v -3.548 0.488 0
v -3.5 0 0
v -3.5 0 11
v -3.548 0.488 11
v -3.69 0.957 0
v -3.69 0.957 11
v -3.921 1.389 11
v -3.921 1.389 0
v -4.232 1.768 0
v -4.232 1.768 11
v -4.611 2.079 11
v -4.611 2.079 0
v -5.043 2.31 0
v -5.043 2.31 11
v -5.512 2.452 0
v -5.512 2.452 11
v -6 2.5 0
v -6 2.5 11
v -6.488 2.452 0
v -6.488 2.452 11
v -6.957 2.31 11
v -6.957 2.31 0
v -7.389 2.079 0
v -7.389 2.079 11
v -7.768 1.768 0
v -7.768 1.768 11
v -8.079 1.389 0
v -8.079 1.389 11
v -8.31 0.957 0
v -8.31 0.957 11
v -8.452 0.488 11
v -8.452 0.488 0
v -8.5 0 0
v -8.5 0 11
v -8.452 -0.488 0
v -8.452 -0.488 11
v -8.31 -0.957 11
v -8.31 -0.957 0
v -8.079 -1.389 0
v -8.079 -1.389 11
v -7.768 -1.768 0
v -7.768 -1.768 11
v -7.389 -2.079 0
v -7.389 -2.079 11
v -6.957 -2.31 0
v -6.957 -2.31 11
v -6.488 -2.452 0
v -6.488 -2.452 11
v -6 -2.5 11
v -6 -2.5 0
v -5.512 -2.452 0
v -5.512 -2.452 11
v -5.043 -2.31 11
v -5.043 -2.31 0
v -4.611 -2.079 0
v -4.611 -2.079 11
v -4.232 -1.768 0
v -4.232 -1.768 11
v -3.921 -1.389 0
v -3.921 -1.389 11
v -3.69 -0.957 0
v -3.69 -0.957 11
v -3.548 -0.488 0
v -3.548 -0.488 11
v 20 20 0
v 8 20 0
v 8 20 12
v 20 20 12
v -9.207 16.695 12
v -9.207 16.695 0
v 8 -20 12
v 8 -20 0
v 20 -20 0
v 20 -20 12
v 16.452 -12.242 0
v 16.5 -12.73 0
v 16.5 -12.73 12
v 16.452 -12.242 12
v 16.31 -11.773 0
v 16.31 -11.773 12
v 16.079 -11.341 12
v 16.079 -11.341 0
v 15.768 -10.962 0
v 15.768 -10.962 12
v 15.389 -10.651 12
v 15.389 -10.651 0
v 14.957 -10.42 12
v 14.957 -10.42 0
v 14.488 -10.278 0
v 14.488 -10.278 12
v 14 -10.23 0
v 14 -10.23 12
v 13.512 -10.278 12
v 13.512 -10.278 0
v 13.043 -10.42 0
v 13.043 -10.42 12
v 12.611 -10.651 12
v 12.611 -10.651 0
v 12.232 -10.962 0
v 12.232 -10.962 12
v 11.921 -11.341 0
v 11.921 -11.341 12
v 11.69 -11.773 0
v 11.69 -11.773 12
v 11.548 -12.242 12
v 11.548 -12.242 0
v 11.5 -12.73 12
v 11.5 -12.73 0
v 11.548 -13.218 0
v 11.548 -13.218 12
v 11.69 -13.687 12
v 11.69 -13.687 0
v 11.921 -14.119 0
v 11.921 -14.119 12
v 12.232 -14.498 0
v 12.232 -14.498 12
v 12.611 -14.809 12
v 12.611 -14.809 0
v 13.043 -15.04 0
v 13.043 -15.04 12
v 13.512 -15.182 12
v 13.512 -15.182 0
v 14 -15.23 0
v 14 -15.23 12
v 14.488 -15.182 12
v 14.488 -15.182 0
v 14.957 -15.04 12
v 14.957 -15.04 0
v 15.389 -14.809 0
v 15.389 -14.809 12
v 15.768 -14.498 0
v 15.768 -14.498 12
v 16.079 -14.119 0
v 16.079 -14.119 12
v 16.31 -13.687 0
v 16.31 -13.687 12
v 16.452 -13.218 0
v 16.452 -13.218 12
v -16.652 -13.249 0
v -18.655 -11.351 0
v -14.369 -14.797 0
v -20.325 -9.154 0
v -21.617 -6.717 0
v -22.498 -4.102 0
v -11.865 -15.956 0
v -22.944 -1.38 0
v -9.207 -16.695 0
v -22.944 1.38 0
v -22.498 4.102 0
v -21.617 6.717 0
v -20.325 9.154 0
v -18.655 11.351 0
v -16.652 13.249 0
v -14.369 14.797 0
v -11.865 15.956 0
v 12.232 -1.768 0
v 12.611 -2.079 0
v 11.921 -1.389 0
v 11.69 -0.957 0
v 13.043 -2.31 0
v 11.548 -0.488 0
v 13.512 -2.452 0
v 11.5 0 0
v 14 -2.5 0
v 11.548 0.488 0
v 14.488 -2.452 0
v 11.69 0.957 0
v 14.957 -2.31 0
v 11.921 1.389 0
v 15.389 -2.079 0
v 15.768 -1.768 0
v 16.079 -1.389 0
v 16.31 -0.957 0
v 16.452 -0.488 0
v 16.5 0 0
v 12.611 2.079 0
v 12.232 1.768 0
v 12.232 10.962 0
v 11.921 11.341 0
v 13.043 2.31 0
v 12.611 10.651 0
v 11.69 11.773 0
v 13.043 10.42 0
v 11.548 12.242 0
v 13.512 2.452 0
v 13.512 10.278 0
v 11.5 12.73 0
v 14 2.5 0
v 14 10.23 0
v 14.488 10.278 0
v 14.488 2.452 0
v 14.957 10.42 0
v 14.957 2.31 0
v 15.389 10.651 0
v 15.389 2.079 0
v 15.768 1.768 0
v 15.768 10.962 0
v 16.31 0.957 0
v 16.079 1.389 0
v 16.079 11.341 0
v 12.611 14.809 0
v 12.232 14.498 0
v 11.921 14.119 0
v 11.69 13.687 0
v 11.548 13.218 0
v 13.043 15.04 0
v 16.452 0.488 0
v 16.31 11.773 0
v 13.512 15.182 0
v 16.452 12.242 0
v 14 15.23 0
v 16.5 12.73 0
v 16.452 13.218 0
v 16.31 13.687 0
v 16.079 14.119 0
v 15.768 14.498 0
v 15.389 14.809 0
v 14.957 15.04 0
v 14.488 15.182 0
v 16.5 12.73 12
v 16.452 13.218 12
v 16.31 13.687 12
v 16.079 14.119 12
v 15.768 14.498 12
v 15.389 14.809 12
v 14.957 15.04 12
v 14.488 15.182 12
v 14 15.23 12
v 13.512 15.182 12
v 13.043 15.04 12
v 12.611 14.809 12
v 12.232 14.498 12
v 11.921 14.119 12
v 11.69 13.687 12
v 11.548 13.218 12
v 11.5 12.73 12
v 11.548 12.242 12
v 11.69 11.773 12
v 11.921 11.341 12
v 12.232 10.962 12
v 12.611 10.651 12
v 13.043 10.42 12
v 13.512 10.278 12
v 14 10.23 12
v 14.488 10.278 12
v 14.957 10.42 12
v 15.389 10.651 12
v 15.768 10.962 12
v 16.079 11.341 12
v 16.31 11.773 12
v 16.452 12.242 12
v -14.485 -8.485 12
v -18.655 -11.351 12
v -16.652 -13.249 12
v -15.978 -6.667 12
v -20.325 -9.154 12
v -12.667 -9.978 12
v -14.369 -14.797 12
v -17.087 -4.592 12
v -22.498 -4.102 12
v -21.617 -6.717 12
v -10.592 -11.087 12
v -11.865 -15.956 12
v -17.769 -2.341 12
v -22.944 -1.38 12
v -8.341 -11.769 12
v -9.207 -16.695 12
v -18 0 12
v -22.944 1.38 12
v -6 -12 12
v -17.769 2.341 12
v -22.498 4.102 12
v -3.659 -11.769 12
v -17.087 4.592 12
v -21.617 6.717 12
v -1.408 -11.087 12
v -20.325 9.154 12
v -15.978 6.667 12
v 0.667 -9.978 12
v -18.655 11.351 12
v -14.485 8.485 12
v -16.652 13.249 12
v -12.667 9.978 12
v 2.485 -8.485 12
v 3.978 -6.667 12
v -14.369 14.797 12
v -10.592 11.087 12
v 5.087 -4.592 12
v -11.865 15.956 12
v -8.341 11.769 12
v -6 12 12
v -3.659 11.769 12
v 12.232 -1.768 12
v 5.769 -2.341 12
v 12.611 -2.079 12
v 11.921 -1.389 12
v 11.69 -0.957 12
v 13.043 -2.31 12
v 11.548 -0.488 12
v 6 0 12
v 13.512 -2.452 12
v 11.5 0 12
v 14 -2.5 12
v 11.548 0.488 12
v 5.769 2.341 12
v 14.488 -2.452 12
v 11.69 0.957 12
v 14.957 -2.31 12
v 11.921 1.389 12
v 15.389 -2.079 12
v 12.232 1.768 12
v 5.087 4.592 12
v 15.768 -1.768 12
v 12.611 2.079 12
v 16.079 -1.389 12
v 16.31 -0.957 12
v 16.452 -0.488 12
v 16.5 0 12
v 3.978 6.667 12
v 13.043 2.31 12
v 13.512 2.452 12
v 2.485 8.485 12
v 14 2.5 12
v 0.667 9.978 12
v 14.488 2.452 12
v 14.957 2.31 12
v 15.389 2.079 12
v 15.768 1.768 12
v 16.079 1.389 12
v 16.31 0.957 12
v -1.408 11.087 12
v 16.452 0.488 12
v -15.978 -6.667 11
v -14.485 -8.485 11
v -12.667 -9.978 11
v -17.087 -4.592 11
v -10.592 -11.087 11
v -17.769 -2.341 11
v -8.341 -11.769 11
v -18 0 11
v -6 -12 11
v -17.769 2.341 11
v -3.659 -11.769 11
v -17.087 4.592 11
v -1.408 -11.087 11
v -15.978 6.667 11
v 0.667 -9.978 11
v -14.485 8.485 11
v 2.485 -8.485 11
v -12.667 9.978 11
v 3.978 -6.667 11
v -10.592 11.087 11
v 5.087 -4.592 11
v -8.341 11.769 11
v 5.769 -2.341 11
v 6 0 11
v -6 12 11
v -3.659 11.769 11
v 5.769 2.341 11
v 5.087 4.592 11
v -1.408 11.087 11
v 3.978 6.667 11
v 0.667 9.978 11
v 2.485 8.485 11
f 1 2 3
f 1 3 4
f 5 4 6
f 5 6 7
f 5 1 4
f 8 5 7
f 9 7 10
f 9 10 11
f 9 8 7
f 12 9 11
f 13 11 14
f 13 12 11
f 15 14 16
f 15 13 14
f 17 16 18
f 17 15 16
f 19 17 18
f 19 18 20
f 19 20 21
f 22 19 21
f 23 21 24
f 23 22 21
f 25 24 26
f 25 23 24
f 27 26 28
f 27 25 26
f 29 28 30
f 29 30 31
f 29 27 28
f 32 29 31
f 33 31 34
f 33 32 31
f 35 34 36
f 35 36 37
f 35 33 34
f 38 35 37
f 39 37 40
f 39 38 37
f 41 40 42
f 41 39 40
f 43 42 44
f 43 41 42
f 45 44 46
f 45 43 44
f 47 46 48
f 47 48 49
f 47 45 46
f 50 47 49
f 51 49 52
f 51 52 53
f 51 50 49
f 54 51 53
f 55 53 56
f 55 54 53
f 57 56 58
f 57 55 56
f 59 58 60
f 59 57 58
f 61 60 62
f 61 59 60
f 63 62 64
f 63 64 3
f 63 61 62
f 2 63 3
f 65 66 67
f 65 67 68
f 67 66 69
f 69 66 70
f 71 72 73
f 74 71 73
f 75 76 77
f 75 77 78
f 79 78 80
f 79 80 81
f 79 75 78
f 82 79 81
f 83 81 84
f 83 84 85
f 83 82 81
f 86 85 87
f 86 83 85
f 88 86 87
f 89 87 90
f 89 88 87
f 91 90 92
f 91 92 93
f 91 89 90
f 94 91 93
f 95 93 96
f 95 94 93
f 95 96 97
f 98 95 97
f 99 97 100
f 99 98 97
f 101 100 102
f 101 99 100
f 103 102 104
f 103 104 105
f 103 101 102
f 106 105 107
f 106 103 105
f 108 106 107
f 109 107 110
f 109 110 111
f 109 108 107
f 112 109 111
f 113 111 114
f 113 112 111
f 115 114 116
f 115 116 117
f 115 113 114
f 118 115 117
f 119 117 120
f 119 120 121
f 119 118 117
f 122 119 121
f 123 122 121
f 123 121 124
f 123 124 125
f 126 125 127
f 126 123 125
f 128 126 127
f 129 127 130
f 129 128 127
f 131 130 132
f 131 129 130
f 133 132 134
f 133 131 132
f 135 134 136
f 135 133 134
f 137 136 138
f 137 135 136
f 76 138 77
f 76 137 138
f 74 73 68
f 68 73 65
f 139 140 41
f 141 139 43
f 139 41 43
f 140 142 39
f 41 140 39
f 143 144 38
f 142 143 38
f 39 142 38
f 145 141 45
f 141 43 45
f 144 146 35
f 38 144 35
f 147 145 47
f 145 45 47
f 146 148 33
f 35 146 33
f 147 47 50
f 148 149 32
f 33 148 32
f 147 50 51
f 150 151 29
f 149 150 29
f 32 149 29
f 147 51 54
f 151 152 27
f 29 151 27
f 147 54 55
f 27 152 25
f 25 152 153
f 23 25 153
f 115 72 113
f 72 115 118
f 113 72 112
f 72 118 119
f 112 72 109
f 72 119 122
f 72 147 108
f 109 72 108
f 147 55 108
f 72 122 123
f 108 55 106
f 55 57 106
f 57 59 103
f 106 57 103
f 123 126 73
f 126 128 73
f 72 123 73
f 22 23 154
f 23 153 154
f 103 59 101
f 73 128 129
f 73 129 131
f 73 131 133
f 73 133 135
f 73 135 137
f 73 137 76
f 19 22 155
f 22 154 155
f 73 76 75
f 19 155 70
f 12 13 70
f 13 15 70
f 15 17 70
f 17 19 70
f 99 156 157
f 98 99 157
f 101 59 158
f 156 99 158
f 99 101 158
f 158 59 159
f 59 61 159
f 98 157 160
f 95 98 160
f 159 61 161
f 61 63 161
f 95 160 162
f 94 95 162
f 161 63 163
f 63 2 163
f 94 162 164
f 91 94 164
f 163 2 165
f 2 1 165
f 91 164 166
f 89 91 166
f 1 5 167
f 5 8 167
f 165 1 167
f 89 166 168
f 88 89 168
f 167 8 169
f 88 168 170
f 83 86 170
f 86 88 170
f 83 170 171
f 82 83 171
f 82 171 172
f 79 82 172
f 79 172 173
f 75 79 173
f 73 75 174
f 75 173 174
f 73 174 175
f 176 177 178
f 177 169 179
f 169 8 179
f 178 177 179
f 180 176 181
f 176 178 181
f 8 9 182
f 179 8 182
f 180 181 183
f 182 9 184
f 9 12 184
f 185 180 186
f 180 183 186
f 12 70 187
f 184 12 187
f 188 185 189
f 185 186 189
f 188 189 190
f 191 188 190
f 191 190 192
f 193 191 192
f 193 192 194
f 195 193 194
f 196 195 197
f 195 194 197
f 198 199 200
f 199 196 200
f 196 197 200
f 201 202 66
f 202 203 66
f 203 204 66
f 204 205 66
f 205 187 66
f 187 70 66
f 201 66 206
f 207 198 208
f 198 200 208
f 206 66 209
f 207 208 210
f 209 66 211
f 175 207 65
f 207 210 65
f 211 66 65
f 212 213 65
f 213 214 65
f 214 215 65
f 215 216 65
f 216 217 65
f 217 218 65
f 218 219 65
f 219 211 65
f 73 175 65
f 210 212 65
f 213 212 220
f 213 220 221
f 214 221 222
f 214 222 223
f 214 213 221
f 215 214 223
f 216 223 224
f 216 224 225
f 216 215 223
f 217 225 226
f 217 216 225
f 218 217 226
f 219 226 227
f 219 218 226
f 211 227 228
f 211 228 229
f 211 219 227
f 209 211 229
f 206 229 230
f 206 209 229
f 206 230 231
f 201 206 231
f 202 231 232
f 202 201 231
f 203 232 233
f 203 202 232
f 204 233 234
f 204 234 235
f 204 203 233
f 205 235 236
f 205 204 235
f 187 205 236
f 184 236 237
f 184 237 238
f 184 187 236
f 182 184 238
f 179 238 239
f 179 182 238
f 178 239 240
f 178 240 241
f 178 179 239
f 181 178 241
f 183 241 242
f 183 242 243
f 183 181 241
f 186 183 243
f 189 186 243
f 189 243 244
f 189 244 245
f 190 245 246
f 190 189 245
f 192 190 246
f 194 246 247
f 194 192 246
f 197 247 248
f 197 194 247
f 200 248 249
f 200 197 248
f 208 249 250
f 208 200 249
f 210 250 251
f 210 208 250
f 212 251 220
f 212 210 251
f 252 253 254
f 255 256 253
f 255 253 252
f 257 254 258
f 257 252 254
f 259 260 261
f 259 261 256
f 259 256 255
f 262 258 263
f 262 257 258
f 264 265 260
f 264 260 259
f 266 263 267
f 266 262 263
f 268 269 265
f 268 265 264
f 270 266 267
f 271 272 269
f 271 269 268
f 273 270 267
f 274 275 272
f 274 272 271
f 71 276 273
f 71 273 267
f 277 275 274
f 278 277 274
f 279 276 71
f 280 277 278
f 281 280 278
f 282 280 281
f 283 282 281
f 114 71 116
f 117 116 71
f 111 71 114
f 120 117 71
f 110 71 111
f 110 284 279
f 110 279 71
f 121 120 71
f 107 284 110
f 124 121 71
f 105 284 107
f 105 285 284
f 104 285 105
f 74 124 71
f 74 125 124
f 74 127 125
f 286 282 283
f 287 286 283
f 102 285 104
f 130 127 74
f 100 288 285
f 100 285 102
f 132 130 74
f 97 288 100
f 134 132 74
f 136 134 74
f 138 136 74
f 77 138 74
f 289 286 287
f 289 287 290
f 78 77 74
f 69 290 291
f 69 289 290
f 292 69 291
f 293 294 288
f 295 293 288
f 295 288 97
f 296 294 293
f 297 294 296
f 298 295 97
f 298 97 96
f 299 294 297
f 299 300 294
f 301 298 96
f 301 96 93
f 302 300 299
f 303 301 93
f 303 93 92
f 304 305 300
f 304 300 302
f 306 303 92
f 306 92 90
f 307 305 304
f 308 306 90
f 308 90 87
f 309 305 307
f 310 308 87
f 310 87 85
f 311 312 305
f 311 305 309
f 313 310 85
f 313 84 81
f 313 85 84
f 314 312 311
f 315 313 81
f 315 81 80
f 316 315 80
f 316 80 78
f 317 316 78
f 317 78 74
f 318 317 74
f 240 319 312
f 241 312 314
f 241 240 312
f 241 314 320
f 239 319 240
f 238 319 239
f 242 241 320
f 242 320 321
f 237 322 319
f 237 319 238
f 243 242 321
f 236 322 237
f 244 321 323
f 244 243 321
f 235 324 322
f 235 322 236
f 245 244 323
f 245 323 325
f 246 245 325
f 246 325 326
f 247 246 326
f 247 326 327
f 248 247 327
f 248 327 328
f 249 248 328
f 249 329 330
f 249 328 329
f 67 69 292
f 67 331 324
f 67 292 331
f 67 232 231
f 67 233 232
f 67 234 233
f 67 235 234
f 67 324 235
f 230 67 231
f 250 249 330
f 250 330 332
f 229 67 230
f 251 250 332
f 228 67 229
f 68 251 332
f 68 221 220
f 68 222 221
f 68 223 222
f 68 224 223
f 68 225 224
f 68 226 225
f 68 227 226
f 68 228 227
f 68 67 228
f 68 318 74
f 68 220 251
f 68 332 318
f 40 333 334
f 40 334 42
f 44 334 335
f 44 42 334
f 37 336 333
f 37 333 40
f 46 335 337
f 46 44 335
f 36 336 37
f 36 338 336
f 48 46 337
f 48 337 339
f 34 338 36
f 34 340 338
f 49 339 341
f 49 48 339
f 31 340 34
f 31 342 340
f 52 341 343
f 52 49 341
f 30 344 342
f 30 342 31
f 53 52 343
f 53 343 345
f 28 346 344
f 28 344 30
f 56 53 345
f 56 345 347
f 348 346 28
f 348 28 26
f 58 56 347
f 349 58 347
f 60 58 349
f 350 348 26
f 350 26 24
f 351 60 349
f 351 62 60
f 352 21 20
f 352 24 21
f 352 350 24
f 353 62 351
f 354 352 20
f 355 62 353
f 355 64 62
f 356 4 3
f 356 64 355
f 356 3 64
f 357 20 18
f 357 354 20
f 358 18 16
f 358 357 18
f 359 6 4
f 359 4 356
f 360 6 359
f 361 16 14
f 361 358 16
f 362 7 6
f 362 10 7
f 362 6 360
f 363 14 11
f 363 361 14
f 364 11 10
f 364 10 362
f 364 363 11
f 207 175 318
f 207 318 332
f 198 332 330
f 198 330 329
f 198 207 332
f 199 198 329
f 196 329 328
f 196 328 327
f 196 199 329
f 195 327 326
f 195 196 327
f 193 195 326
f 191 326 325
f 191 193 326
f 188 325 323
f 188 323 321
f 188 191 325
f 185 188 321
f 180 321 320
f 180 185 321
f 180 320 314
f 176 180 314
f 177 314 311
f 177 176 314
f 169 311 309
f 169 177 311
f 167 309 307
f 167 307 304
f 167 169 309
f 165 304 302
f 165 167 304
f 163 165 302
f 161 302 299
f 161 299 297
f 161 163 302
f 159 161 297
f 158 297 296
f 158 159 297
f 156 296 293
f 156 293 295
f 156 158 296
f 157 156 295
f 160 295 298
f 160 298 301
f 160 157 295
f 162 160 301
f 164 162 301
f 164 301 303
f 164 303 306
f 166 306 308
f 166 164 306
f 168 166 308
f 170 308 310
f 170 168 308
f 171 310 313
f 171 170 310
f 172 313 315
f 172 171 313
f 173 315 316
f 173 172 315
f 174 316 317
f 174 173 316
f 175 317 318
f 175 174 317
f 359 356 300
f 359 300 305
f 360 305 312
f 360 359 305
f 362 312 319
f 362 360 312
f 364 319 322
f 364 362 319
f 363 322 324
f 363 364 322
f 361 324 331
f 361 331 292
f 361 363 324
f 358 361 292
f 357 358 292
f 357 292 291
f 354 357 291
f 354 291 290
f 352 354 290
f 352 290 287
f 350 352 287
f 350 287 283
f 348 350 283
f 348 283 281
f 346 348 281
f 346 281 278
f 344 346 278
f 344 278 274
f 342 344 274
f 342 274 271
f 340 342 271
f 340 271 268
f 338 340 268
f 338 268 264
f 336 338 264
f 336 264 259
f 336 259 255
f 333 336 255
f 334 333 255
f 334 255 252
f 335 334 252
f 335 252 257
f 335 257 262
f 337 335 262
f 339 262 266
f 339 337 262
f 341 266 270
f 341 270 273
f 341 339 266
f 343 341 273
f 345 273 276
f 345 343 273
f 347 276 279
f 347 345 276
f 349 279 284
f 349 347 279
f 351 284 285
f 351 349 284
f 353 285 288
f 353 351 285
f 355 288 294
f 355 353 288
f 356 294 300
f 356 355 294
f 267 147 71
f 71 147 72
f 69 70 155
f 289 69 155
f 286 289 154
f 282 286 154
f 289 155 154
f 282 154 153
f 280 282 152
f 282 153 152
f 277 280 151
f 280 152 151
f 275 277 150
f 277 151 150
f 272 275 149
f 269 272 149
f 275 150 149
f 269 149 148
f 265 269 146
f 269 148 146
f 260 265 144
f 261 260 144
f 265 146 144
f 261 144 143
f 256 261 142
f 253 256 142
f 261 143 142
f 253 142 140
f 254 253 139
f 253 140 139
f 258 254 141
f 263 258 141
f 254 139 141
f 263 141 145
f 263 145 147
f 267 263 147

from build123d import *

# Parameters (mm, degrees)
F0_W     = 12
F0_H     = 40
F0_R     = 2.5
F0_R_2   = 12
F1_DEPTH = 12
F2_DEPTH = 11


with BuildPart() as f1:
    # F0 (on Top) → F1 (new body)
    with BuildSketch(Plane.XY):
        with Locations((14, 0)):
            Rectangle(F0_W, F0_H)
        with Locations((14, -12.73)):
            Circle(F0_R, mode=Mode.SUBTRACT)
        with Locations((14, 0)):
            Circle(F0_R, mode=Mode.SUBTRACT)
        with Locations((14, 12.73)):
            Circle(F0_R, mode=Mode.SUBTRACT)
        with BuildLine():
            Line((-9.206848, -16.694793), (8, -20))
            Line((8, -20), (8, 20))
            Line((8, 20), (-9.206848, 16.694793))
            ThreePointArc((-9.206848, 16.694793), (-23, 0), (-9.206848, -16.694793))
        make_face()
        with Locations((-6, 0)):
            Circle(F0_R_2, mode=Mode.SUBTRACT)
    extrude(amount=F1_DEPTH)

    # F0 (on Top) → F2 (join)
    with BuildSketch(Plane.XY):
        with Locations((-6, 0)):
            Circle(F0_R_2)
        with Locations((-6, 0)):
            Circle(F0_R, mode=Mode.SUBTRACT)
    extrude(amount=F2_DEPTH)


solid = f1.part
